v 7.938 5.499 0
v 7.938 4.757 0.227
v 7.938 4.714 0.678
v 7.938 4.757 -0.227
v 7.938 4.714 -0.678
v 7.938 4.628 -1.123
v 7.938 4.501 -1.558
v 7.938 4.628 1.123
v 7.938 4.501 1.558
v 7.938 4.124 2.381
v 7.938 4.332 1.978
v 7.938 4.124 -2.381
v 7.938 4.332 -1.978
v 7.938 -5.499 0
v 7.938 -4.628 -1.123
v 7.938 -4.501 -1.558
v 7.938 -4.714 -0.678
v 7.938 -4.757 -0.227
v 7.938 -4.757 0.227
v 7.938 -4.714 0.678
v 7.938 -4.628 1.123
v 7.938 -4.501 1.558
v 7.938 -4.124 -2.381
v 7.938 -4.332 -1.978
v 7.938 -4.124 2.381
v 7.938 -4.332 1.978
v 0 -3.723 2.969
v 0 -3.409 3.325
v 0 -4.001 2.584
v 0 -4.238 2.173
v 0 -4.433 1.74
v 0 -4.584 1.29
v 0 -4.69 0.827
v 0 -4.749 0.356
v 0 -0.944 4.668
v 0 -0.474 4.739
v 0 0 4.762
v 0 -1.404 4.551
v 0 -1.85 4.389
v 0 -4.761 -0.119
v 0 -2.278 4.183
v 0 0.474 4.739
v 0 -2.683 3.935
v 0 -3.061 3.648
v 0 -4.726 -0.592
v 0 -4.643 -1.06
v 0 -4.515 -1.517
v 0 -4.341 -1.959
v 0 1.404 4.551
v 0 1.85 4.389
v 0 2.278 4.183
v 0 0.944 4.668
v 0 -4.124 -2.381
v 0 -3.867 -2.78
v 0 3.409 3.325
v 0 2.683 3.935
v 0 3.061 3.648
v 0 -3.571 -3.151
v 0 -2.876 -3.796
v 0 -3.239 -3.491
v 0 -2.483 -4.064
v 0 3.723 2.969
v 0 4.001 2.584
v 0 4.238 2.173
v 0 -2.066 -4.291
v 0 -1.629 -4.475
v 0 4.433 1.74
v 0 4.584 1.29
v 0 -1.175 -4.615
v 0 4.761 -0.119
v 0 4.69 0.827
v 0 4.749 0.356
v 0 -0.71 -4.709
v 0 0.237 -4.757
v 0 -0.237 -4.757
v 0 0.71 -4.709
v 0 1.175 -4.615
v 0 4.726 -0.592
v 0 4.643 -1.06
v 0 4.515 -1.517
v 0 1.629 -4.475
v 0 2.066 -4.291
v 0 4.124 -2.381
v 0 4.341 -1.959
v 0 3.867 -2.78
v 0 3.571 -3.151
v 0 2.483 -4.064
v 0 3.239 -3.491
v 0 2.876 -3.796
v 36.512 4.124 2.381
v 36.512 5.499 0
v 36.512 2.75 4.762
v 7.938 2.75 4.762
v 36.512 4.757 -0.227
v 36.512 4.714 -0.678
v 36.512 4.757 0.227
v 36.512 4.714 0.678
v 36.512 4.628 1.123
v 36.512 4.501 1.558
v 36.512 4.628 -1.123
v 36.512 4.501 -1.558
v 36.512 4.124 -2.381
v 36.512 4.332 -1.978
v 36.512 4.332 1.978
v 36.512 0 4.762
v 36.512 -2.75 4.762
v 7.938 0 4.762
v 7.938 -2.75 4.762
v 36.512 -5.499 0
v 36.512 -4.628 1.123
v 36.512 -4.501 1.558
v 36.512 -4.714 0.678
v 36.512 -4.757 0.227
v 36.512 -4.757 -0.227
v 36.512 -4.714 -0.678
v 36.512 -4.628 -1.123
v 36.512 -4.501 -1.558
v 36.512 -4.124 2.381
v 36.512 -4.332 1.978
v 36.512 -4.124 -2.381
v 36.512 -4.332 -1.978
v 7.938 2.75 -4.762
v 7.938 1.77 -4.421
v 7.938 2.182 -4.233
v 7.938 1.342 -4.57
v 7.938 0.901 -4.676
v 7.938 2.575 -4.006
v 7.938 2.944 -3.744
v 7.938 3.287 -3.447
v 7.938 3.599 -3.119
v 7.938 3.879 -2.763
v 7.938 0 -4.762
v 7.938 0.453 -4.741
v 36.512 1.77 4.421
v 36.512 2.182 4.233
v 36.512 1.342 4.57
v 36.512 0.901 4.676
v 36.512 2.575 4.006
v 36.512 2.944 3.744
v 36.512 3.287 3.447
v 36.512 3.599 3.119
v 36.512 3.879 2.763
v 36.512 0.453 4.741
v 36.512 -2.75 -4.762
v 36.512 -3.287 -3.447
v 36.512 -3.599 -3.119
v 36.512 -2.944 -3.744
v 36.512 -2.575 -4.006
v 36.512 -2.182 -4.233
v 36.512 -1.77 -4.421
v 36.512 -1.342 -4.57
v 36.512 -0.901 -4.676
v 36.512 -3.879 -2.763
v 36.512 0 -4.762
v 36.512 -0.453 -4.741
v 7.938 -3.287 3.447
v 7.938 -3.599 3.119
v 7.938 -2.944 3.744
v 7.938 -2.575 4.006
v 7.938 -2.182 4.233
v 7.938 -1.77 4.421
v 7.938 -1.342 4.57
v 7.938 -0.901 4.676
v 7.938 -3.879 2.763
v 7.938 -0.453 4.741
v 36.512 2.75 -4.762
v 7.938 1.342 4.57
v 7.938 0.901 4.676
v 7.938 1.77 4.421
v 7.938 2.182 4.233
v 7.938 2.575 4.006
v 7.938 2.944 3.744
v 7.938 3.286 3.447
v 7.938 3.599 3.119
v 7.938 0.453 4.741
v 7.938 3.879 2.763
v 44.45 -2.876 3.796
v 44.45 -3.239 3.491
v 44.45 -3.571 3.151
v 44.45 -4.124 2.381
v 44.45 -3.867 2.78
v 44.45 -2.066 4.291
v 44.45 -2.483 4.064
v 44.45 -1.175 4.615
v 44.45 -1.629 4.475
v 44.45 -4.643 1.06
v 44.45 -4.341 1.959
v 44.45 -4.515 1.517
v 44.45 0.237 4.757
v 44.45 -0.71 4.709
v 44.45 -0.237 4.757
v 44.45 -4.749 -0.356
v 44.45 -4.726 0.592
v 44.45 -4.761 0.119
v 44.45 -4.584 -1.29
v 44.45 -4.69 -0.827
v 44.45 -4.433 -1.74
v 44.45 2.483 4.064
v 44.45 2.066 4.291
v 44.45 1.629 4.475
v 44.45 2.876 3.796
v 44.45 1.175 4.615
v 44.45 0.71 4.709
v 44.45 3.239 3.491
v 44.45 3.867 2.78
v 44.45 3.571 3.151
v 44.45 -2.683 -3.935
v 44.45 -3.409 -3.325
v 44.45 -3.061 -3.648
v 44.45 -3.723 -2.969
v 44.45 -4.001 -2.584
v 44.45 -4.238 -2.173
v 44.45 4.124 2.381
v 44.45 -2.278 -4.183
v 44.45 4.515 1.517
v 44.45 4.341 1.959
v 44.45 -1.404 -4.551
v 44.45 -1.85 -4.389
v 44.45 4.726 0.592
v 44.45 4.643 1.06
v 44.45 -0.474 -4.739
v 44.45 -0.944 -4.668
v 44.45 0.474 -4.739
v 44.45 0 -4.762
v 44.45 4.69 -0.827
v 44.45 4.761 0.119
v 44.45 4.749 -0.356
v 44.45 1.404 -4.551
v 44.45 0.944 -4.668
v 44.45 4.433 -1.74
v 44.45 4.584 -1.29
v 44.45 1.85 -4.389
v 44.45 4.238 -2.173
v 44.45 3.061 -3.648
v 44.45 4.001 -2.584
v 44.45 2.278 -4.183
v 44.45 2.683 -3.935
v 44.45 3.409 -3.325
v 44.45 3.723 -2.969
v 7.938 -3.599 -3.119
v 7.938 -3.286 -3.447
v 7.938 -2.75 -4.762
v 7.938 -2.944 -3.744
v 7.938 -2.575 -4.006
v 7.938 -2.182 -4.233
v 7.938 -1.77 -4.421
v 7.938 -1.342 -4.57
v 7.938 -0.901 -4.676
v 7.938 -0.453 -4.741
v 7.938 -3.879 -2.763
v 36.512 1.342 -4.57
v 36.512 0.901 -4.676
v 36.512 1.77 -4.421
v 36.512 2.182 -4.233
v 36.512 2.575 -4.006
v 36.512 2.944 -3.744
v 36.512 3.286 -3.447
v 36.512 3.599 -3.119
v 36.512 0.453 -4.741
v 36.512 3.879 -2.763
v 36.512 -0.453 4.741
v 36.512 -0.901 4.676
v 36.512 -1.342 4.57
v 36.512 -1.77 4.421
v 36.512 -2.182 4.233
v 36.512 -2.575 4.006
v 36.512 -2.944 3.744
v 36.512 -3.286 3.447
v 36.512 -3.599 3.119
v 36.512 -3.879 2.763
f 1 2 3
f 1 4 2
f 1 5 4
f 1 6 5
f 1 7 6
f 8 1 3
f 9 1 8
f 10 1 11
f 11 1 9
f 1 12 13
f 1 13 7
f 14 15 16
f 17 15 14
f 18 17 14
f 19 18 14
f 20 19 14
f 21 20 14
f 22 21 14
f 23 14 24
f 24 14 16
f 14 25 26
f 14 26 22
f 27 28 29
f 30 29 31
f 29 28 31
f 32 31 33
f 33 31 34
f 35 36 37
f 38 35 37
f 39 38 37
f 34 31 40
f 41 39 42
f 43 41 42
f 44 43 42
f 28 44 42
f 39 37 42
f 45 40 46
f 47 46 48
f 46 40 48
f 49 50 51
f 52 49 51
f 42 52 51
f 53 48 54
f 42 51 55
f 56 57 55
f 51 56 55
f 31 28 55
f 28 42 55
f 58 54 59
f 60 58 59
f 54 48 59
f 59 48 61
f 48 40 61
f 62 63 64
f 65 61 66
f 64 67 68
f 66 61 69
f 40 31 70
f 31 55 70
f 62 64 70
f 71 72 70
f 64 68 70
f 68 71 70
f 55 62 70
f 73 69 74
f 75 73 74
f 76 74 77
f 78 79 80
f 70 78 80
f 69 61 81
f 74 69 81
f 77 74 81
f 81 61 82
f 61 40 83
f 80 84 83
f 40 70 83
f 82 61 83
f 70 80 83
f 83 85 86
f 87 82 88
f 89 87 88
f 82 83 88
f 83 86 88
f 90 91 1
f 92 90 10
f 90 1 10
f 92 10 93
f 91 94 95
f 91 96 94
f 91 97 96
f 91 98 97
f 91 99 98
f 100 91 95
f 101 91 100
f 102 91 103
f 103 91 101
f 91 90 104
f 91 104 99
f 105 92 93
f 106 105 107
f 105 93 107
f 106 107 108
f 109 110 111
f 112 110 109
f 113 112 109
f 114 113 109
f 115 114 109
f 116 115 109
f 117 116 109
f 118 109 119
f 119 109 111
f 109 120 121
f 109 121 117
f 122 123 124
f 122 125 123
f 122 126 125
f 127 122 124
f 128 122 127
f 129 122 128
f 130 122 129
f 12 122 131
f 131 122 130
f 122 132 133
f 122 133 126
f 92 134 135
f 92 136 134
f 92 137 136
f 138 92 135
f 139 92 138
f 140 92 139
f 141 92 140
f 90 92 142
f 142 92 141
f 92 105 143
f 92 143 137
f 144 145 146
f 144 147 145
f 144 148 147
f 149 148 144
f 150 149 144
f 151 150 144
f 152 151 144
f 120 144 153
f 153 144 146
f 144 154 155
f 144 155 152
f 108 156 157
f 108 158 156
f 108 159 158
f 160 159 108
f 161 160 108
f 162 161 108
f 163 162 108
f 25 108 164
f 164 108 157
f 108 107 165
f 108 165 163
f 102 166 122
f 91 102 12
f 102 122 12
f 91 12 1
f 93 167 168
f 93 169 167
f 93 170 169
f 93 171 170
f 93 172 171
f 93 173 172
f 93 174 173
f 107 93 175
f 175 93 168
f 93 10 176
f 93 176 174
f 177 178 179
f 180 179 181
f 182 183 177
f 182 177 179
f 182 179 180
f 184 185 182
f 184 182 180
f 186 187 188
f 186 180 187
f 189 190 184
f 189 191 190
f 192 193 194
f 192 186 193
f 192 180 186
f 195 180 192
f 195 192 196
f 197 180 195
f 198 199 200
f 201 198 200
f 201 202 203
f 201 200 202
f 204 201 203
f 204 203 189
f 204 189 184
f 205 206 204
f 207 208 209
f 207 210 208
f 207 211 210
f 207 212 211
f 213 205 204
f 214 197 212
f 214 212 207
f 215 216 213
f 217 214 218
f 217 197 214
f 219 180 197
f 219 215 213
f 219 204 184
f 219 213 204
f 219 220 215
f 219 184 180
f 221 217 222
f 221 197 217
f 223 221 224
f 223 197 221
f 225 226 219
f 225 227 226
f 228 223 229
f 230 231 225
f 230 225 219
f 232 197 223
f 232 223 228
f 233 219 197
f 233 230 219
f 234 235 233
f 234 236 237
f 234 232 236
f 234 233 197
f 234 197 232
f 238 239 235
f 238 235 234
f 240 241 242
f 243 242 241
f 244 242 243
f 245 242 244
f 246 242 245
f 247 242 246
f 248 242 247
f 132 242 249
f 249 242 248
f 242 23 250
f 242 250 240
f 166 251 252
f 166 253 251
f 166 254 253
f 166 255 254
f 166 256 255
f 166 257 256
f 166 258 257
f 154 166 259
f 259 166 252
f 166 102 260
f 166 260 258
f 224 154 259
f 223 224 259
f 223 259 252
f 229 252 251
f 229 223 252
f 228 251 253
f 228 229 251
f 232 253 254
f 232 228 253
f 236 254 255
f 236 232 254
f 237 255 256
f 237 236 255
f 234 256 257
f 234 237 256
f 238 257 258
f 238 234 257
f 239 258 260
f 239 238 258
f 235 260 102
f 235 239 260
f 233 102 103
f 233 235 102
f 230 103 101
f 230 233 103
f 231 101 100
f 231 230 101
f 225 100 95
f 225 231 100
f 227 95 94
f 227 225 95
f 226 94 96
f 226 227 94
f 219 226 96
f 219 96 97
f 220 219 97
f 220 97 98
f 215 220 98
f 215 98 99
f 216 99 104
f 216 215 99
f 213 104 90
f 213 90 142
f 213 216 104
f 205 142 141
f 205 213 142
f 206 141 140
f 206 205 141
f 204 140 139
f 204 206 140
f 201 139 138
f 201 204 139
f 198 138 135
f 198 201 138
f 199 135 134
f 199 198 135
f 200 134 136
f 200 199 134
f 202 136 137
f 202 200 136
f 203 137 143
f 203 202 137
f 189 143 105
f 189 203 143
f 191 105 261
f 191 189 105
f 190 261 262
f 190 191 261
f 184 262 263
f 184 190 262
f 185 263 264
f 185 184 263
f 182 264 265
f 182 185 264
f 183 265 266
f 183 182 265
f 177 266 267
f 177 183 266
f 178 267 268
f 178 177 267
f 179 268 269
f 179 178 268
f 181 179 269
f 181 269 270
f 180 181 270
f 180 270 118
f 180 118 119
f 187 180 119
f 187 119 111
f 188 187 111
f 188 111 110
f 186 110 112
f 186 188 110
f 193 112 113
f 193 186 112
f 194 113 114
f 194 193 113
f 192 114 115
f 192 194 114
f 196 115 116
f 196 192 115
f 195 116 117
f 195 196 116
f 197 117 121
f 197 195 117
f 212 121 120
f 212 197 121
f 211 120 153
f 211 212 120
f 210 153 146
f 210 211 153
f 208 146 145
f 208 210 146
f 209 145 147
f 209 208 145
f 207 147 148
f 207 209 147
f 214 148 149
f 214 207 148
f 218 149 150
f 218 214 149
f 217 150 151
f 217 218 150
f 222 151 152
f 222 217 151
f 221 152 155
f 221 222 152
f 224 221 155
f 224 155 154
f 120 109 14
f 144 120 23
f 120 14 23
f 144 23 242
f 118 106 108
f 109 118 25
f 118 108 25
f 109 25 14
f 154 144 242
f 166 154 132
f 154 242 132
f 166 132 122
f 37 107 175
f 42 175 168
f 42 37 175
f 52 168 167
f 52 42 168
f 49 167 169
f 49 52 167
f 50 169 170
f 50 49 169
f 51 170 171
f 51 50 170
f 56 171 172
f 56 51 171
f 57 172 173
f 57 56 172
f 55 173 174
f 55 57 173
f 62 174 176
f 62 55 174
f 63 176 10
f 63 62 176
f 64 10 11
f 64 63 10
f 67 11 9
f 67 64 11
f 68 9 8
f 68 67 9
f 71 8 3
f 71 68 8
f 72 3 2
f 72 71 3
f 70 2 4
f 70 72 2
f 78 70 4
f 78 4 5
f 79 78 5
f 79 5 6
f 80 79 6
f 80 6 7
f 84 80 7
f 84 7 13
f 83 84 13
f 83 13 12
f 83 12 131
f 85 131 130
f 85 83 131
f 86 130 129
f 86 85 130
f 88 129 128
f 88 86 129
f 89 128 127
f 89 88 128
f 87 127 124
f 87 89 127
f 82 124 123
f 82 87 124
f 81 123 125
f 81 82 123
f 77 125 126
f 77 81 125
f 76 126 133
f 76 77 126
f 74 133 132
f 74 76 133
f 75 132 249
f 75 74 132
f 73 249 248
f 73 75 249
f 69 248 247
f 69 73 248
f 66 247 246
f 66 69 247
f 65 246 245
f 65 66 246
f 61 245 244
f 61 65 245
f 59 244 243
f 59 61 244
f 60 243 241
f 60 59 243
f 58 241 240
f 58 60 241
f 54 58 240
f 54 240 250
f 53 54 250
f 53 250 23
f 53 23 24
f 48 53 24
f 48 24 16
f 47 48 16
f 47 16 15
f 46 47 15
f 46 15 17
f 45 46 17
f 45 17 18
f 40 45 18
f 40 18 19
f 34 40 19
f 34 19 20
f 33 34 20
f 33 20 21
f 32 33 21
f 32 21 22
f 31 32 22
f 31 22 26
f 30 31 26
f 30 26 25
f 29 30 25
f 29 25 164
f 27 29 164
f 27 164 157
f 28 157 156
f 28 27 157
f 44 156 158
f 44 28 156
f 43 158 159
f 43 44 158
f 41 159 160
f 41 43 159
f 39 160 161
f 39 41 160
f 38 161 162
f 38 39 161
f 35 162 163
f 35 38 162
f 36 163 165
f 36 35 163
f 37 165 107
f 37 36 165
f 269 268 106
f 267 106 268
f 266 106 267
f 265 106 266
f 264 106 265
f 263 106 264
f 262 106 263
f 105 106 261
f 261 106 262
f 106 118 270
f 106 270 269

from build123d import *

# Parameters (mm, degrees)
BOSS_EXTRUDE1_DEPTH = 44.45
SKETCH2_R           = 5.499261314
SKETCH2_R_2         = 4.7625
CUT_EXTRUDE1_DEPTH  = 7.9375
SKETCH3_R           = 5.499261314
SKETCH3_R_2         = 4.7625
CUT_EXTRUDE2_DEPTH  = 7.9375


with BuildPart() as part:
    # Sketch1 → Boss-Extrude1 (new body)
    with BuildSketch(Plane(origin=(0, 0, 0), x_dir=(0, 0, -1), z_dir=(1, 0, 0))):
        Polygon((0, 5.499261314), (-4.7625, 2.749630657), (-4.7625, -2.749630657), (0, -5.499261314), (4.7625, -2.749630657), (4.7625, 2.749630657), align=None)
    extrude(amount=BOSS_EXTRUDE1_DEPTH)

    # Sketch2 → Cut-Extrude1 (cut)
    with BuildSketch(Plane.ZY):
        Circle(SKETCH2_R)
        Circle(SKETCH2_R_2, mode=Mode.SUBTRACT)
    extrude(amount=-CUT_EXTRUDE1_DEPTH, mode=Mode.SUBTRACT)

    # Sketch3 → Cut-Extrude2 (cut)
    with BuildSketch(Plane(origin=(44.45, 0, 0), x_dir=(0, 0, -1), z_dir=(1, 0, 0))):
        Circle(SKETCH3_R)
        Circle(SKETCH3_R_2, mode=Mode.SUBTRACT)
    extrude(amount=-CUT_EXTRUDE2_DEPTH, mode=Mode.SUBTRACT)


solid = part.part
